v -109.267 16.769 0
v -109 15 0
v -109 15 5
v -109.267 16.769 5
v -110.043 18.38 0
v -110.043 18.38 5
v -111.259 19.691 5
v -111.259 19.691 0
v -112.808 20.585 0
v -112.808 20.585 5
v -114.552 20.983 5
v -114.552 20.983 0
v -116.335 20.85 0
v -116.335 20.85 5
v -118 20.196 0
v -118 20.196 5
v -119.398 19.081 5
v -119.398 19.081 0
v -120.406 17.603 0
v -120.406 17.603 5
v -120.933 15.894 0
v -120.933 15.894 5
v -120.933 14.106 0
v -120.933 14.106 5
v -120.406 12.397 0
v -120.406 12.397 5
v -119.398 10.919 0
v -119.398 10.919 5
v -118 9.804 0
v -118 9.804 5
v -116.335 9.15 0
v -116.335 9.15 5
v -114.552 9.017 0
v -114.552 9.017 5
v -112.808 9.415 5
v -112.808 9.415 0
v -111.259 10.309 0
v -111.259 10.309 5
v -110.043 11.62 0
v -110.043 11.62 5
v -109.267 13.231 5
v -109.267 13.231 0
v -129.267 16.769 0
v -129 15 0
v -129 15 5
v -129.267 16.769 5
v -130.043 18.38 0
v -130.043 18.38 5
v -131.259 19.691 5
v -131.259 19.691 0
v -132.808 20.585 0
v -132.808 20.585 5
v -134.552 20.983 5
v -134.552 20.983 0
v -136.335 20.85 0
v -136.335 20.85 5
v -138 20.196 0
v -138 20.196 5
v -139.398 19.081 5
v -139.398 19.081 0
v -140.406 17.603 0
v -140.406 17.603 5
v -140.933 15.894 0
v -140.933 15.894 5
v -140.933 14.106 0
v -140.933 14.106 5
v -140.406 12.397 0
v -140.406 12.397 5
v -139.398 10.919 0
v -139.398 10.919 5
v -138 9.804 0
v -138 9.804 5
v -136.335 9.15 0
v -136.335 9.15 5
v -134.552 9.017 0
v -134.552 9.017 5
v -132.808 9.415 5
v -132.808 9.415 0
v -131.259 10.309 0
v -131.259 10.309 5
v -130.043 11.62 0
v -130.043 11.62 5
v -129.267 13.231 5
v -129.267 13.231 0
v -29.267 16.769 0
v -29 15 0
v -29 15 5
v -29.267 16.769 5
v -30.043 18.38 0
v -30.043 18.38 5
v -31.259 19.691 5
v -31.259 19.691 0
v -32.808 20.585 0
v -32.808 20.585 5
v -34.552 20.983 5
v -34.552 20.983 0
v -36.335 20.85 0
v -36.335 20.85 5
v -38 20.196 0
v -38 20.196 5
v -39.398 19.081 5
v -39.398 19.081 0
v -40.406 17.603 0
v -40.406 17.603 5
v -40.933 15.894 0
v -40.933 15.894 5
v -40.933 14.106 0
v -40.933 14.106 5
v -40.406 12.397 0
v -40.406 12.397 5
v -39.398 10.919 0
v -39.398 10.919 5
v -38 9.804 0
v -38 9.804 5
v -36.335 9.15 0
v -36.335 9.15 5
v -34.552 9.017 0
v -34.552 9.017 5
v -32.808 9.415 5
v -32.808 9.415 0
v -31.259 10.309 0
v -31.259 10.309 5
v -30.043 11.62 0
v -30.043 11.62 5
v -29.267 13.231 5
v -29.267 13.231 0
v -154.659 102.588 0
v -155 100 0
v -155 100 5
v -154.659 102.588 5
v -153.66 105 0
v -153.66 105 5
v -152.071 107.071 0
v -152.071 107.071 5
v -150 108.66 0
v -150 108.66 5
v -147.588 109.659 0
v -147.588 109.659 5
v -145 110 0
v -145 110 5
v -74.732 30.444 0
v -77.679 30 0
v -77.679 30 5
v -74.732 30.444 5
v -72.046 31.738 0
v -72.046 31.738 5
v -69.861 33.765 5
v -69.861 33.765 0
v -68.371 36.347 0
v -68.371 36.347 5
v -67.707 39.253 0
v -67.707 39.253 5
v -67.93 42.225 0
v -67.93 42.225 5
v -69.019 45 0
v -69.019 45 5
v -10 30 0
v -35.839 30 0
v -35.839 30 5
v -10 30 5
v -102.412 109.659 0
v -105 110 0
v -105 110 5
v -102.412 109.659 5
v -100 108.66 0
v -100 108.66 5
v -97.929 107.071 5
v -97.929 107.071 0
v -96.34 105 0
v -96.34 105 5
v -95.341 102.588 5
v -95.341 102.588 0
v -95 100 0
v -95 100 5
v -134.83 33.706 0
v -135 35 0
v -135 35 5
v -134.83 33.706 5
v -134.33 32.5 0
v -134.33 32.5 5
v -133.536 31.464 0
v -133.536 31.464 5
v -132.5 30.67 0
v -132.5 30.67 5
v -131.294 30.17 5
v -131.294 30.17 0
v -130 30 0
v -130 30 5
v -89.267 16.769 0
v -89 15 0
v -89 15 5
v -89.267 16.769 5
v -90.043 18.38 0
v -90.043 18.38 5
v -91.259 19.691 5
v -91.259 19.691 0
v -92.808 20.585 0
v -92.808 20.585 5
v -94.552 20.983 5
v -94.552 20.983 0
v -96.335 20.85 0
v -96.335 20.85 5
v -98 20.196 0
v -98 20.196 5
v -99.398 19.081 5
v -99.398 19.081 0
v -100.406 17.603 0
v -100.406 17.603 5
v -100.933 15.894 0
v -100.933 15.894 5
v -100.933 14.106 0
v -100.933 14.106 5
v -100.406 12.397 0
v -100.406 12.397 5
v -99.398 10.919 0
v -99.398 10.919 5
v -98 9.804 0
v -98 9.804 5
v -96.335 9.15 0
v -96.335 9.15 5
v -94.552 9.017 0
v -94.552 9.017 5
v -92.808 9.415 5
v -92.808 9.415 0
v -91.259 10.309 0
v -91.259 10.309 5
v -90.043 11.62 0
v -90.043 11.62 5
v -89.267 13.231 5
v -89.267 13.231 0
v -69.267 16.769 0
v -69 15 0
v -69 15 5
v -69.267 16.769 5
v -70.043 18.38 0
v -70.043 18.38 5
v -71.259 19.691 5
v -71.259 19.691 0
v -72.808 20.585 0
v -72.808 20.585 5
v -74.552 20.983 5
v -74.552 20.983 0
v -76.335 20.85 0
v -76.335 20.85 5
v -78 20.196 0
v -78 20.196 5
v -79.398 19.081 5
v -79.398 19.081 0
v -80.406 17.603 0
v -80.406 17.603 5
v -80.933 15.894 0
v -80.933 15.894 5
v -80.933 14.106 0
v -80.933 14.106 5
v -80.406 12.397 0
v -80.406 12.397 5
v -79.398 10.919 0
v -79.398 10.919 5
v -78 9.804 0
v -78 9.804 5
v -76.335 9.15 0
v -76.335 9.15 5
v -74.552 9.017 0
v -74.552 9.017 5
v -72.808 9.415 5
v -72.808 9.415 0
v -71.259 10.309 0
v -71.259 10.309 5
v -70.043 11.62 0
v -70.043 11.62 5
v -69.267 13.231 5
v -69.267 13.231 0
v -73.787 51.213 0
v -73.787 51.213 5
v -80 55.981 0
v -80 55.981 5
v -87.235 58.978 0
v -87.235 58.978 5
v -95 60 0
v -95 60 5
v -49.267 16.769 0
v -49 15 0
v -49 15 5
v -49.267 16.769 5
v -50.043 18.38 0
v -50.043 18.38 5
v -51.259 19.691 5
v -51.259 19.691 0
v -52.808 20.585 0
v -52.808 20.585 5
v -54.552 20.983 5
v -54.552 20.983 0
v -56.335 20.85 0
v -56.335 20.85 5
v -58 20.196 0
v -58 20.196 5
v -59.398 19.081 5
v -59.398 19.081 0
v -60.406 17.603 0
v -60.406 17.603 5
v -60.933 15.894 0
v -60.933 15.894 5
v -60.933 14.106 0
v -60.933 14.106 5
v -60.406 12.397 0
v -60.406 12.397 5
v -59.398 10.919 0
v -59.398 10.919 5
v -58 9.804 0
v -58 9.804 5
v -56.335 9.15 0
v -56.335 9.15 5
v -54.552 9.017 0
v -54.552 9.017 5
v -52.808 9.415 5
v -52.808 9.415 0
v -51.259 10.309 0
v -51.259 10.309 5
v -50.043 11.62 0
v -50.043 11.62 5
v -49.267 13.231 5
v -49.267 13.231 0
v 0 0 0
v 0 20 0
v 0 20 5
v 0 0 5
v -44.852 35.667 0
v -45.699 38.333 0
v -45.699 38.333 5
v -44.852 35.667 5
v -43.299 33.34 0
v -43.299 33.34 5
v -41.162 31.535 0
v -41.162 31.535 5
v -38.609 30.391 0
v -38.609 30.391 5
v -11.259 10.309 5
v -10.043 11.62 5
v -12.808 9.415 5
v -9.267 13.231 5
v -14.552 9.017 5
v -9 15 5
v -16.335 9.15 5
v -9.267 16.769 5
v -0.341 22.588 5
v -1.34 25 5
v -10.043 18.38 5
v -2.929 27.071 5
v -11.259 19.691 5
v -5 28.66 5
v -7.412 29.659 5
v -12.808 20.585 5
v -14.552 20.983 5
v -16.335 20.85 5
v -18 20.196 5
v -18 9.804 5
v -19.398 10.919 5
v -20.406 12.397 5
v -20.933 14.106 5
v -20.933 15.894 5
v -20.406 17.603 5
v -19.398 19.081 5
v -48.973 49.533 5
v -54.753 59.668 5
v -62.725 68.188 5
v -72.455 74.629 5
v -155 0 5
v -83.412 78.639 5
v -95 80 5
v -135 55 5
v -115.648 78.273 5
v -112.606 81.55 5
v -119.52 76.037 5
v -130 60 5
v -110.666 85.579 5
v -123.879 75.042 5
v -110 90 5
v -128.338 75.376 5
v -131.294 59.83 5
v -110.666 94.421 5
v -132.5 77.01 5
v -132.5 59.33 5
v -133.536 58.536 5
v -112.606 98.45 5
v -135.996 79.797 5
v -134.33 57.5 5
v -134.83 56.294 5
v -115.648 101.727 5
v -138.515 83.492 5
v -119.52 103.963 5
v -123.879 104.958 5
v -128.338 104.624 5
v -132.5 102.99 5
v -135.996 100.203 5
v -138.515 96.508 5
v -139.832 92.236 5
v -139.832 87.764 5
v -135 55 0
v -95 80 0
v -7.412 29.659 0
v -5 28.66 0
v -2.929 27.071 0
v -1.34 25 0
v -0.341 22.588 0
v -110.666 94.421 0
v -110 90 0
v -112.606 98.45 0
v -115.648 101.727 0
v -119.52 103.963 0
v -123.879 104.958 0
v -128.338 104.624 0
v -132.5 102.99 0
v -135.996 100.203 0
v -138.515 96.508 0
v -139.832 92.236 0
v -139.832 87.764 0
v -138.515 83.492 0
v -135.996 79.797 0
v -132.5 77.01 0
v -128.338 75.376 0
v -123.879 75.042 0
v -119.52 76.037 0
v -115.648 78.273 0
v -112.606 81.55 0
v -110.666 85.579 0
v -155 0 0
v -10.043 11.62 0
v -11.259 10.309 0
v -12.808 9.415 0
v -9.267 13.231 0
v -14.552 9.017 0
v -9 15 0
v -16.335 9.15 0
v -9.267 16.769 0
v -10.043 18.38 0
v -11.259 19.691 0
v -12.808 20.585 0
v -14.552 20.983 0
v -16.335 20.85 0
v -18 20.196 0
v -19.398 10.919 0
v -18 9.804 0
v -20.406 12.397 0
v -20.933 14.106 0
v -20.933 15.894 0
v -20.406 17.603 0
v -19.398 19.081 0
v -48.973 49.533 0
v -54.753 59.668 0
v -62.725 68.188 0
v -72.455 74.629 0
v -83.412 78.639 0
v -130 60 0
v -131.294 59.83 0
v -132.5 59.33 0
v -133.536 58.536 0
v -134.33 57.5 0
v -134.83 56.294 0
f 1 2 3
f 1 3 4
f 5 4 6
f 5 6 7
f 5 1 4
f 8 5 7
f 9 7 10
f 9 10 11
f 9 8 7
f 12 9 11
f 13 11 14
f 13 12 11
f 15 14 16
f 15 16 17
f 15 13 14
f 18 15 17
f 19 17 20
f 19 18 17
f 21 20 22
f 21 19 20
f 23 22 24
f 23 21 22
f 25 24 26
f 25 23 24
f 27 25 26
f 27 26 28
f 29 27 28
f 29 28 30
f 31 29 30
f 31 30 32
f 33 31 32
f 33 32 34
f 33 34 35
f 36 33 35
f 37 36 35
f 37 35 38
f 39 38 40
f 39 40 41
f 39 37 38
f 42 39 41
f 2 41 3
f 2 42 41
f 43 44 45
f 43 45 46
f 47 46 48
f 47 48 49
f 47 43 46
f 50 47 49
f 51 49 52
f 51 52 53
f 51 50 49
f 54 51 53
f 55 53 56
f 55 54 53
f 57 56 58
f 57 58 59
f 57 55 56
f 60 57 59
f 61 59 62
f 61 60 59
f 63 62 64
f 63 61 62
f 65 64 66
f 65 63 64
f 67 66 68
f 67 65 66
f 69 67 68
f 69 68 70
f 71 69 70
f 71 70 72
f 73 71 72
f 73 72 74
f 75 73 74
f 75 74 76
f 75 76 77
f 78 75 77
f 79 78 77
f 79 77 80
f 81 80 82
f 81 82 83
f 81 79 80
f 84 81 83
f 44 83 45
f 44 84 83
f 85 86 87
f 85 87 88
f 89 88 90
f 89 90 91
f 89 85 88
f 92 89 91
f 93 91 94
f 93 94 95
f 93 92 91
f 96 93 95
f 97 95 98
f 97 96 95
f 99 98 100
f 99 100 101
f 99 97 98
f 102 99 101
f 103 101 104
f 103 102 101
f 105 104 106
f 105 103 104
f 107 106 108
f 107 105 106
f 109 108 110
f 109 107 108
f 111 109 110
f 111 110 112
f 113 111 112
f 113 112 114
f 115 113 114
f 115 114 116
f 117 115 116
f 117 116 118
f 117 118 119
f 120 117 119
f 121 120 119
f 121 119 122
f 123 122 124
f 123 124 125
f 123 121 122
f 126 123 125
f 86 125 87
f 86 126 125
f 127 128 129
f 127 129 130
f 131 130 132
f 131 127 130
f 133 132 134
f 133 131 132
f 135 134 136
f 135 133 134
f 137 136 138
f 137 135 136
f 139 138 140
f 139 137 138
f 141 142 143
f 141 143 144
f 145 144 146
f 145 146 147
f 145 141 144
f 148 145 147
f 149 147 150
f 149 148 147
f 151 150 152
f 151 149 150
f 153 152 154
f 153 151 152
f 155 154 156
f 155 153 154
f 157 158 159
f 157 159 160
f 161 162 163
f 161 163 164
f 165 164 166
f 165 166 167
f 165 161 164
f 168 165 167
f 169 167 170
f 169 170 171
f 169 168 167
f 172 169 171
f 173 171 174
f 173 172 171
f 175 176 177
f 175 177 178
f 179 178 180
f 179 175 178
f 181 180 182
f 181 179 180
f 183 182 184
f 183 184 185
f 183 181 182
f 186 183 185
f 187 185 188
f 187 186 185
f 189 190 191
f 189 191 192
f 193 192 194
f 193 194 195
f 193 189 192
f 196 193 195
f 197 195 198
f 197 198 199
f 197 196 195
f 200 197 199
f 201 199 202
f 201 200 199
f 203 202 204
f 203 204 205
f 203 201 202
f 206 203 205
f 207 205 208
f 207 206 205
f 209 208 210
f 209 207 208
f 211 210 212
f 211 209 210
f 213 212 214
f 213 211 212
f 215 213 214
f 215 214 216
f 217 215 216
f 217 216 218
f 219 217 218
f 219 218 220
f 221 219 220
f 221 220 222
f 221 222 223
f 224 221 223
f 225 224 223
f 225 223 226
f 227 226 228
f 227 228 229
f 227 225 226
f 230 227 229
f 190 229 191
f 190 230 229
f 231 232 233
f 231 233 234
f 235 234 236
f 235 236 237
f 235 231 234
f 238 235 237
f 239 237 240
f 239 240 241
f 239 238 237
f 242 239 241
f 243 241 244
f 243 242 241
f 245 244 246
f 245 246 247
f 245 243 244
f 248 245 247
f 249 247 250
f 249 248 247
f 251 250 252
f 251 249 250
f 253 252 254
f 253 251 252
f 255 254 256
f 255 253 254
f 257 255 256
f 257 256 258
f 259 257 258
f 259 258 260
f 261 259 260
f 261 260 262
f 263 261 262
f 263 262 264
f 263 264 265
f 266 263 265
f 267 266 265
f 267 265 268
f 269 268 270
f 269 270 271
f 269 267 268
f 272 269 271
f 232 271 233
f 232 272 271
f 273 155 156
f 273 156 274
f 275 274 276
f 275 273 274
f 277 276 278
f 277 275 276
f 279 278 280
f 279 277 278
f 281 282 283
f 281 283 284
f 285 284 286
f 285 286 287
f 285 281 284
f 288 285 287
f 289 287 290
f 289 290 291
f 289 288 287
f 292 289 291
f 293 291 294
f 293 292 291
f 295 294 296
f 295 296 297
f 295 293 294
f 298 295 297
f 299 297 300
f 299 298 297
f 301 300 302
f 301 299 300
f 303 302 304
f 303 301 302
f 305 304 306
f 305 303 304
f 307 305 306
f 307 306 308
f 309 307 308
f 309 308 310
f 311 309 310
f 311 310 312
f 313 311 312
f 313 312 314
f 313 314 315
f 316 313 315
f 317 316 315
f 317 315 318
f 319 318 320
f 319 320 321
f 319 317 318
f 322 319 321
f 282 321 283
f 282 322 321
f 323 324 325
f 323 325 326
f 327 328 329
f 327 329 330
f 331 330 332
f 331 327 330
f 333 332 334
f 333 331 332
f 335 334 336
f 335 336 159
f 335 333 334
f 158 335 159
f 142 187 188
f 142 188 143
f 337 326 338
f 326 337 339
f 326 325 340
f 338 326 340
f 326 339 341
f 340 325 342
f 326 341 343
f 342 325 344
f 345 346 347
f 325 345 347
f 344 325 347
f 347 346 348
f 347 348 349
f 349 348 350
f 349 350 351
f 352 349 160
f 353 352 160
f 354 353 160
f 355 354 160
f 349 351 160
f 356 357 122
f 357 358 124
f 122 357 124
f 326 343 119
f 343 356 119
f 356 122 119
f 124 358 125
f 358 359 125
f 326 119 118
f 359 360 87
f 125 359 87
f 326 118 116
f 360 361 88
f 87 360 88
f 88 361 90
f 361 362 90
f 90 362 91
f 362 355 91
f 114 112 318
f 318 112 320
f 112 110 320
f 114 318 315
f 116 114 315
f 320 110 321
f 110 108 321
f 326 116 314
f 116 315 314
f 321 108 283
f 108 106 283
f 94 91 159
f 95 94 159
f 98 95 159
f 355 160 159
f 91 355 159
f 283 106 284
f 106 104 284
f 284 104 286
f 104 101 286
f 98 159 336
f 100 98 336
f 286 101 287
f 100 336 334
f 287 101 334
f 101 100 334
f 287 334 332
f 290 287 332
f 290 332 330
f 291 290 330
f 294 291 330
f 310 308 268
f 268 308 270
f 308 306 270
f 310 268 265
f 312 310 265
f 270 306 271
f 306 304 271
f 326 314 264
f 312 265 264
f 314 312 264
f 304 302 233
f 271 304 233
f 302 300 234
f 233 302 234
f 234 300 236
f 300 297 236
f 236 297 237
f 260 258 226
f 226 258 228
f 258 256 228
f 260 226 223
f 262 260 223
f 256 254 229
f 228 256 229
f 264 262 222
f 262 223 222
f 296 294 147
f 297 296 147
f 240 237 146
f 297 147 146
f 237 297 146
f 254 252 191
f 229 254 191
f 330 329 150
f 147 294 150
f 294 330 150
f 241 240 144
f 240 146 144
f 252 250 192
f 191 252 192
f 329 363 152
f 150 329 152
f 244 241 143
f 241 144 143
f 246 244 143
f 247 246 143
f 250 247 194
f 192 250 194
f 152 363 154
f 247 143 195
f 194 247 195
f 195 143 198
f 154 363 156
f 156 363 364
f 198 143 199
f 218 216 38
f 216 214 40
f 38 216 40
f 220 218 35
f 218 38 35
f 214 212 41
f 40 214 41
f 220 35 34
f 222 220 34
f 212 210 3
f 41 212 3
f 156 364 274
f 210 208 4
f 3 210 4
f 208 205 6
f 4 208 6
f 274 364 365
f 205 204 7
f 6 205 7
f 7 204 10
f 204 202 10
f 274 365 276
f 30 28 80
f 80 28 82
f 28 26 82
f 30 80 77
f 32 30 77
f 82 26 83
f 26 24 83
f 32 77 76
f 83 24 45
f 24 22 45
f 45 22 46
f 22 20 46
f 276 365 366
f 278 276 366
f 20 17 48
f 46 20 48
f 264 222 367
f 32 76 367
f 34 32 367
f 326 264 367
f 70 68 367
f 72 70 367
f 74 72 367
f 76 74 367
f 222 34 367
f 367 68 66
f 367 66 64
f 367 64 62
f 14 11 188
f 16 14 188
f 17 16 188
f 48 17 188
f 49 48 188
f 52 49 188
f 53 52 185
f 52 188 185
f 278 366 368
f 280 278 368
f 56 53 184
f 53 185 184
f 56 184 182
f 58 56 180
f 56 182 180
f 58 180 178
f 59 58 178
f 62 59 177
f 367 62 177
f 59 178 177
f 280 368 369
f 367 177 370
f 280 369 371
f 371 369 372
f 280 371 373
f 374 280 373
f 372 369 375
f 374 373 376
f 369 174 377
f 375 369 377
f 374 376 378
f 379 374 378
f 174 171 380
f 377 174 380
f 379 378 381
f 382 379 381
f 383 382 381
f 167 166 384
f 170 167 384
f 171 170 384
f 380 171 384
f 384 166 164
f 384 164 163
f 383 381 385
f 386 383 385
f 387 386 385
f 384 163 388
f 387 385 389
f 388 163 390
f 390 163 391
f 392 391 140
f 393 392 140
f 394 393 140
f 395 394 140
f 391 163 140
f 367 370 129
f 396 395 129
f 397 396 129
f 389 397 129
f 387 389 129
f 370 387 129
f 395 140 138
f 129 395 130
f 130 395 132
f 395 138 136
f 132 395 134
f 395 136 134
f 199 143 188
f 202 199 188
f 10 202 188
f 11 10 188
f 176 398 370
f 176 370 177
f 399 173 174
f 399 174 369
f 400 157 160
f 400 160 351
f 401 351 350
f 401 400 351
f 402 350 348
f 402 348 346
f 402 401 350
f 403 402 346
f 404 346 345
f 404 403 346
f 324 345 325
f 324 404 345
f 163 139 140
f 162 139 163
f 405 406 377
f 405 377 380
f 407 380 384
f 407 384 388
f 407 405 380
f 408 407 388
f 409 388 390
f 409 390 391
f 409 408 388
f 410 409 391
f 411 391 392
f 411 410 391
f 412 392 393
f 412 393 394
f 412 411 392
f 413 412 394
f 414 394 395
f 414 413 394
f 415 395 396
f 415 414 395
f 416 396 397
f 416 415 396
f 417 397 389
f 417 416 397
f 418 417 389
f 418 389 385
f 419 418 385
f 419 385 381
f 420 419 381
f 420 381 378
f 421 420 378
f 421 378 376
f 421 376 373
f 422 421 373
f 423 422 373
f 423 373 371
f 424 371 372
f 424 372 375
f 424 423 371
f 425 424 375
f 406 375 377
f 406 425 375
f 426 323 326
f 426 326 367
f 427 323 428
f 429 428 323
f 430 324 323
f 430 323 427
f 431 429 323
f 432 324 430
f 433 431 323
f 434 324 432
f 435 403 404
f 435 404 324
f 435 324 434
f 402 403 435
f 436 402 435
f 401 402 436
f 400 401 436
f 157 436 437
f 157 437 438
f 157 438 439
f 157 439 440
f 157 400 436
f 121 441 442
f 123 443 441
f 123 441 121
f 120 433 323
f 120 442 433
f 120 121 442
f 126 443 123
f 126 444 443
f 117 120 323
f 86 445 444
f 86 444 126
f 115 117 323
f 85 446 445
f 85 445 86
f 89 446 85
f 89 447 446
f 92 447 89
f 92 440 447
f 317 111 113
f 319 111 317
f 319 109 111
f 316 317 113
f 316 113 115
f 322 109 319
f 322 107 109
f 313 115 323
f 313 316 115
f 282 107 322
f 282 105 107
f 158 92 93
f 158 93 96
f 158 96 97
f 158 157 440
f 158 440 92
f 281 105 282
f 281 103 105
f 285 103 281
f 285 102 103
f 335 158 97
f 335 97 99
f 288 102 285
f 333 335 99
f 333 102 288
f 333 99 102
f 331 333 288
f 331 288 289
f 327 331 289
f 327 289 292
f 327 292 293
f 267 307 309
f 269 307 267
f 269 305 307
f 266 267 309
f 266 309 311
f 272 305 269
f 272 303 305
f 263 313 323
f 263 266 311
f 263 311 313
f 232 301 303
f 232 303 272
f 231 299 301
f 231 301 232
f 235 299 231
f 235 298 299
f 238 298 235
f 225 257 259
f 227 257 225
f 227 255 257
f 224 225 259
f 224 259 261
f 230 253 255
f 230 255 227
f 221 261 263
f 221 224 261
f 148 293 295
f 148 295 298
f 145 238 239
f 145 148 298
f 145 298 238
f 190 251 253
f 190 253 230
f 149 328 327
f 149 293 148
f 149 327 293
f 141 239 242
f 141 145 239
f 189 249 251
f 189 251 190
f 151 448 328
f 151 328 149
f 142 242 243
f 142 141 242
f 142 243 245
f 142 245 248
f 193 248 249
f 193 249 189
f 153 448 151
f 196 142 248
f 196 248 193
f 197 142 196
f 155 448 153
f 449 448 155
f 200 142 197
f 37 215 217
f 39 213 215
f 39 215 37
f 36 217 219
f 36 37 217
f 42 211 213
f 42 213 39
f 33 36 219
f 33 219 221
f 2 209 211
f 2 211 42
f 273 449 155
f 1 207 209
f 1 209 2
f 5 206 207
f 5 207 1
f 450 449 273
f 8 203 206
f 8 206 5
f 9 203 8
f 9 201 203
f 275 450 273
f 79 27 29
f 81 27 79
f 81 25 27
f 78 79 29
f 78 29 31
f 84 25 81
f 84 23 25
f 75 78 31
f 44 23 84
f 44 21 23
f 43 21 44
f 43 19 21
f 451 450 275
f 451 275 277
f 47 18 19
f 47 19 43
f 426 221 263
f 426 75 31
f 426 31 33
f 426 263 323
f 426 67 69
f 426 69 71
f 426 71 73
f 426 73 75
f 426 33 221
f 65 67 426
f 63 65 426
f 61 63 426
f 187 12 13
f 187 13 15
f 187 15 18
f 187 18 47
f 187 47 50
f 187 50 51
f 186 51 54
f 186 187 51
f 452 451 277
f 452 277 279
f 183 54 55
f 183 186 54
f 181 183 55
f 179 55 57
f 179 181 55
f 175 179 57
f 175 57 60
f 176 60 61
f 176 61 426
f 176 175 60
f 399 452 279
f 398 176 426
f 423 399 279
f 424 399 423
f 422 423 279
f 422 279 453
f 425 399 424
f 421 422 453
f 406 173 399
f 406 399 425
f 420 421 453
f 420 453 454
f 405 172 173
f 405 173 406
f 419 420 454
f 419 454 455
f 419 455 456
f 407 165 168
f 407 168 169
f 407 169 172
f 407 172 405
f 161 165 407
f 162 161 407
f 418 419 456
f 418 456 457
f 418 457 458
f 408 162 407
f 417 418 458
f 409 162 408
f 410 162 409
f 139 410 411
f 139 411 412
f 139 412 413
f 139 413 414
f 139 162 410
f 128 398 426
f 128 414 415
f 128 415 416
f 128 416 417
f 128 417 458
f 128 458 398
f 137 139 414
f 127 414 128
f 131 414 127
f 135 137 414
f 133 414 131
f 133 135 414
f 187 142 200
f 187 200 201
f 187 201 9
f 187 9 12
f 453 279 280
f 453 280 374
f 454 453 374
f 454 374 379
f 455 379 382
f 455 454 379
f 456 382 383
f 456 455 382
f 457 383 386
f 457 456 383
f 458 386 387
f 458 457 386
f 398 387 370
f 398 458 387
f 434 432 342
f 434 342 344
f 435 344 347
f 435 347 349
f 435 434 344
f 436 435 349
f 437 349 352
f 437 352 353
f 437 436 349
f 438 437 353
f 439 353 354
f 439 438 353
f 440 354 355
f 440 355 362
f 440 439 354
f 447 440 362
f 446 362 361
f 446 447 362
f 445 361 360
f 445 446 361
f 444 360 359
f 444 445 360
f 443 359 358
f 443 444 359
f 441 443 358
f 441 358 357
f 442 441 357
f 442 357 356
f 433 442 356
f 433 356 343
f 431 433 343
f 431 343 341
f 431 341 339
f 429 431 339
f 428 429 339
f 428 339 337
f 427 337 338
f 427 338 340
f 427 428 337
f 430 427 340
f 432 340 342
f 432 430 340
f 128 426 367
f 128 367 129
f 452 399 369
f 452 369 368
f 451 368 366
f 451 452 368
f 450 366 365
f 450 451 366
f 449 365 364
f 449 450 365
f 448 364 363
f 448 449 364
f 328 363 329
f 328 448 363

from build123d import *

# Parameters (mm, degrees)
SKETCH2_R           = 15
SKETCH2_R_2         = 6
BOSS_EXTRUDE1_DEPTH = 5


with BuildPart() as part:
    # Sketch2 → Boss-Extrude1 (new body)
    with BuildSketch(Plane.XY):
        with BuildLine():
            Line((0, 0), (-155, 0))
            Line((-155, 0), (-155, 100))
            ThreePointArc((-155, 100), (-152.071067812, 107.071067812), (-145, 110))
            Line((-145, 110), (-105, 110))
            ThreePointArc((-105, 110), (-97.928932188, 107.071067812), (-95, 100))
            Line((-95, 100), (-95, 80))
            ThreePointArc((-95, 80), (-62.725138782, 68.188130791), (-45.699335141, 38.333333333))
            ThreePointArc((-45.699335141, 38.333333333), (-42.294174413, 32.362373842), (-35.839202169, 30))
            Line((-35.839202169, 30), (-10, 30))
            ThreePointArc((-10, 30), (-2.928932188, 27.071067812), (0, 20))
            Line((0, 20), (0, 0))
        make_face()
        with Locations((-125, 90)):
            Circle(SKETCH2_R, mode=Mode.SUBTRACT)
        with Locations((-135, 15)):
            Circle(SKETCH2_R_2, mode=Mode.SUBTRACT)
        with Locations((-115, 15)):
            Circle(SKETCH2_R_2, mode=Mode.SUBTRACT)
        with Locations((-95, 15)):
            Circle(SKETCH2_R_2, mode=Mode.SUBTRACT)
        with Locations((-75, 15)):
            Circle(SKETCH2_R_2, mode=Mode.SUBTRACT)
        with Locations((-55, 15)):
            Circle(SKETCH2_R_2, mode=Mode.SUBTRACT)
        with Locations((-35, 15)):
            Circle(SKETCH2_R_2, mode=Mode.SUBTRACT)
        with Locations((-15, 15)):
            Circle(SKETCH2_R_2, mode=Mode.SUBTRACT)
        with BuildLine():
            Line((-95, 60), (-130, 60))
            ThreePointArc((-130, 60), (-133.535533906, 58.535533906), (-135, 55))
            Line((-135, 55), (-135, 35))
            ThreePointArc((-135, 35), (-133.535533906, 31.464466094), (-130, 30))
            Line((-130, 30), (-95, 30))
            Line((-95, 30), (-77.679491924, 30))
            ThreePointArc((-77.679491924, 30), (-69.019237886, 35), (-69.019237886, 45))
            ThreePointArc((-69.019237886, 45), (-80, 55.980762114), (-95, 60))
        make_face(mode=Mode.SUBTRACT)
    extrude(amount=BOSS_EXTRUDE1_DEPTH)


solid = part.part
